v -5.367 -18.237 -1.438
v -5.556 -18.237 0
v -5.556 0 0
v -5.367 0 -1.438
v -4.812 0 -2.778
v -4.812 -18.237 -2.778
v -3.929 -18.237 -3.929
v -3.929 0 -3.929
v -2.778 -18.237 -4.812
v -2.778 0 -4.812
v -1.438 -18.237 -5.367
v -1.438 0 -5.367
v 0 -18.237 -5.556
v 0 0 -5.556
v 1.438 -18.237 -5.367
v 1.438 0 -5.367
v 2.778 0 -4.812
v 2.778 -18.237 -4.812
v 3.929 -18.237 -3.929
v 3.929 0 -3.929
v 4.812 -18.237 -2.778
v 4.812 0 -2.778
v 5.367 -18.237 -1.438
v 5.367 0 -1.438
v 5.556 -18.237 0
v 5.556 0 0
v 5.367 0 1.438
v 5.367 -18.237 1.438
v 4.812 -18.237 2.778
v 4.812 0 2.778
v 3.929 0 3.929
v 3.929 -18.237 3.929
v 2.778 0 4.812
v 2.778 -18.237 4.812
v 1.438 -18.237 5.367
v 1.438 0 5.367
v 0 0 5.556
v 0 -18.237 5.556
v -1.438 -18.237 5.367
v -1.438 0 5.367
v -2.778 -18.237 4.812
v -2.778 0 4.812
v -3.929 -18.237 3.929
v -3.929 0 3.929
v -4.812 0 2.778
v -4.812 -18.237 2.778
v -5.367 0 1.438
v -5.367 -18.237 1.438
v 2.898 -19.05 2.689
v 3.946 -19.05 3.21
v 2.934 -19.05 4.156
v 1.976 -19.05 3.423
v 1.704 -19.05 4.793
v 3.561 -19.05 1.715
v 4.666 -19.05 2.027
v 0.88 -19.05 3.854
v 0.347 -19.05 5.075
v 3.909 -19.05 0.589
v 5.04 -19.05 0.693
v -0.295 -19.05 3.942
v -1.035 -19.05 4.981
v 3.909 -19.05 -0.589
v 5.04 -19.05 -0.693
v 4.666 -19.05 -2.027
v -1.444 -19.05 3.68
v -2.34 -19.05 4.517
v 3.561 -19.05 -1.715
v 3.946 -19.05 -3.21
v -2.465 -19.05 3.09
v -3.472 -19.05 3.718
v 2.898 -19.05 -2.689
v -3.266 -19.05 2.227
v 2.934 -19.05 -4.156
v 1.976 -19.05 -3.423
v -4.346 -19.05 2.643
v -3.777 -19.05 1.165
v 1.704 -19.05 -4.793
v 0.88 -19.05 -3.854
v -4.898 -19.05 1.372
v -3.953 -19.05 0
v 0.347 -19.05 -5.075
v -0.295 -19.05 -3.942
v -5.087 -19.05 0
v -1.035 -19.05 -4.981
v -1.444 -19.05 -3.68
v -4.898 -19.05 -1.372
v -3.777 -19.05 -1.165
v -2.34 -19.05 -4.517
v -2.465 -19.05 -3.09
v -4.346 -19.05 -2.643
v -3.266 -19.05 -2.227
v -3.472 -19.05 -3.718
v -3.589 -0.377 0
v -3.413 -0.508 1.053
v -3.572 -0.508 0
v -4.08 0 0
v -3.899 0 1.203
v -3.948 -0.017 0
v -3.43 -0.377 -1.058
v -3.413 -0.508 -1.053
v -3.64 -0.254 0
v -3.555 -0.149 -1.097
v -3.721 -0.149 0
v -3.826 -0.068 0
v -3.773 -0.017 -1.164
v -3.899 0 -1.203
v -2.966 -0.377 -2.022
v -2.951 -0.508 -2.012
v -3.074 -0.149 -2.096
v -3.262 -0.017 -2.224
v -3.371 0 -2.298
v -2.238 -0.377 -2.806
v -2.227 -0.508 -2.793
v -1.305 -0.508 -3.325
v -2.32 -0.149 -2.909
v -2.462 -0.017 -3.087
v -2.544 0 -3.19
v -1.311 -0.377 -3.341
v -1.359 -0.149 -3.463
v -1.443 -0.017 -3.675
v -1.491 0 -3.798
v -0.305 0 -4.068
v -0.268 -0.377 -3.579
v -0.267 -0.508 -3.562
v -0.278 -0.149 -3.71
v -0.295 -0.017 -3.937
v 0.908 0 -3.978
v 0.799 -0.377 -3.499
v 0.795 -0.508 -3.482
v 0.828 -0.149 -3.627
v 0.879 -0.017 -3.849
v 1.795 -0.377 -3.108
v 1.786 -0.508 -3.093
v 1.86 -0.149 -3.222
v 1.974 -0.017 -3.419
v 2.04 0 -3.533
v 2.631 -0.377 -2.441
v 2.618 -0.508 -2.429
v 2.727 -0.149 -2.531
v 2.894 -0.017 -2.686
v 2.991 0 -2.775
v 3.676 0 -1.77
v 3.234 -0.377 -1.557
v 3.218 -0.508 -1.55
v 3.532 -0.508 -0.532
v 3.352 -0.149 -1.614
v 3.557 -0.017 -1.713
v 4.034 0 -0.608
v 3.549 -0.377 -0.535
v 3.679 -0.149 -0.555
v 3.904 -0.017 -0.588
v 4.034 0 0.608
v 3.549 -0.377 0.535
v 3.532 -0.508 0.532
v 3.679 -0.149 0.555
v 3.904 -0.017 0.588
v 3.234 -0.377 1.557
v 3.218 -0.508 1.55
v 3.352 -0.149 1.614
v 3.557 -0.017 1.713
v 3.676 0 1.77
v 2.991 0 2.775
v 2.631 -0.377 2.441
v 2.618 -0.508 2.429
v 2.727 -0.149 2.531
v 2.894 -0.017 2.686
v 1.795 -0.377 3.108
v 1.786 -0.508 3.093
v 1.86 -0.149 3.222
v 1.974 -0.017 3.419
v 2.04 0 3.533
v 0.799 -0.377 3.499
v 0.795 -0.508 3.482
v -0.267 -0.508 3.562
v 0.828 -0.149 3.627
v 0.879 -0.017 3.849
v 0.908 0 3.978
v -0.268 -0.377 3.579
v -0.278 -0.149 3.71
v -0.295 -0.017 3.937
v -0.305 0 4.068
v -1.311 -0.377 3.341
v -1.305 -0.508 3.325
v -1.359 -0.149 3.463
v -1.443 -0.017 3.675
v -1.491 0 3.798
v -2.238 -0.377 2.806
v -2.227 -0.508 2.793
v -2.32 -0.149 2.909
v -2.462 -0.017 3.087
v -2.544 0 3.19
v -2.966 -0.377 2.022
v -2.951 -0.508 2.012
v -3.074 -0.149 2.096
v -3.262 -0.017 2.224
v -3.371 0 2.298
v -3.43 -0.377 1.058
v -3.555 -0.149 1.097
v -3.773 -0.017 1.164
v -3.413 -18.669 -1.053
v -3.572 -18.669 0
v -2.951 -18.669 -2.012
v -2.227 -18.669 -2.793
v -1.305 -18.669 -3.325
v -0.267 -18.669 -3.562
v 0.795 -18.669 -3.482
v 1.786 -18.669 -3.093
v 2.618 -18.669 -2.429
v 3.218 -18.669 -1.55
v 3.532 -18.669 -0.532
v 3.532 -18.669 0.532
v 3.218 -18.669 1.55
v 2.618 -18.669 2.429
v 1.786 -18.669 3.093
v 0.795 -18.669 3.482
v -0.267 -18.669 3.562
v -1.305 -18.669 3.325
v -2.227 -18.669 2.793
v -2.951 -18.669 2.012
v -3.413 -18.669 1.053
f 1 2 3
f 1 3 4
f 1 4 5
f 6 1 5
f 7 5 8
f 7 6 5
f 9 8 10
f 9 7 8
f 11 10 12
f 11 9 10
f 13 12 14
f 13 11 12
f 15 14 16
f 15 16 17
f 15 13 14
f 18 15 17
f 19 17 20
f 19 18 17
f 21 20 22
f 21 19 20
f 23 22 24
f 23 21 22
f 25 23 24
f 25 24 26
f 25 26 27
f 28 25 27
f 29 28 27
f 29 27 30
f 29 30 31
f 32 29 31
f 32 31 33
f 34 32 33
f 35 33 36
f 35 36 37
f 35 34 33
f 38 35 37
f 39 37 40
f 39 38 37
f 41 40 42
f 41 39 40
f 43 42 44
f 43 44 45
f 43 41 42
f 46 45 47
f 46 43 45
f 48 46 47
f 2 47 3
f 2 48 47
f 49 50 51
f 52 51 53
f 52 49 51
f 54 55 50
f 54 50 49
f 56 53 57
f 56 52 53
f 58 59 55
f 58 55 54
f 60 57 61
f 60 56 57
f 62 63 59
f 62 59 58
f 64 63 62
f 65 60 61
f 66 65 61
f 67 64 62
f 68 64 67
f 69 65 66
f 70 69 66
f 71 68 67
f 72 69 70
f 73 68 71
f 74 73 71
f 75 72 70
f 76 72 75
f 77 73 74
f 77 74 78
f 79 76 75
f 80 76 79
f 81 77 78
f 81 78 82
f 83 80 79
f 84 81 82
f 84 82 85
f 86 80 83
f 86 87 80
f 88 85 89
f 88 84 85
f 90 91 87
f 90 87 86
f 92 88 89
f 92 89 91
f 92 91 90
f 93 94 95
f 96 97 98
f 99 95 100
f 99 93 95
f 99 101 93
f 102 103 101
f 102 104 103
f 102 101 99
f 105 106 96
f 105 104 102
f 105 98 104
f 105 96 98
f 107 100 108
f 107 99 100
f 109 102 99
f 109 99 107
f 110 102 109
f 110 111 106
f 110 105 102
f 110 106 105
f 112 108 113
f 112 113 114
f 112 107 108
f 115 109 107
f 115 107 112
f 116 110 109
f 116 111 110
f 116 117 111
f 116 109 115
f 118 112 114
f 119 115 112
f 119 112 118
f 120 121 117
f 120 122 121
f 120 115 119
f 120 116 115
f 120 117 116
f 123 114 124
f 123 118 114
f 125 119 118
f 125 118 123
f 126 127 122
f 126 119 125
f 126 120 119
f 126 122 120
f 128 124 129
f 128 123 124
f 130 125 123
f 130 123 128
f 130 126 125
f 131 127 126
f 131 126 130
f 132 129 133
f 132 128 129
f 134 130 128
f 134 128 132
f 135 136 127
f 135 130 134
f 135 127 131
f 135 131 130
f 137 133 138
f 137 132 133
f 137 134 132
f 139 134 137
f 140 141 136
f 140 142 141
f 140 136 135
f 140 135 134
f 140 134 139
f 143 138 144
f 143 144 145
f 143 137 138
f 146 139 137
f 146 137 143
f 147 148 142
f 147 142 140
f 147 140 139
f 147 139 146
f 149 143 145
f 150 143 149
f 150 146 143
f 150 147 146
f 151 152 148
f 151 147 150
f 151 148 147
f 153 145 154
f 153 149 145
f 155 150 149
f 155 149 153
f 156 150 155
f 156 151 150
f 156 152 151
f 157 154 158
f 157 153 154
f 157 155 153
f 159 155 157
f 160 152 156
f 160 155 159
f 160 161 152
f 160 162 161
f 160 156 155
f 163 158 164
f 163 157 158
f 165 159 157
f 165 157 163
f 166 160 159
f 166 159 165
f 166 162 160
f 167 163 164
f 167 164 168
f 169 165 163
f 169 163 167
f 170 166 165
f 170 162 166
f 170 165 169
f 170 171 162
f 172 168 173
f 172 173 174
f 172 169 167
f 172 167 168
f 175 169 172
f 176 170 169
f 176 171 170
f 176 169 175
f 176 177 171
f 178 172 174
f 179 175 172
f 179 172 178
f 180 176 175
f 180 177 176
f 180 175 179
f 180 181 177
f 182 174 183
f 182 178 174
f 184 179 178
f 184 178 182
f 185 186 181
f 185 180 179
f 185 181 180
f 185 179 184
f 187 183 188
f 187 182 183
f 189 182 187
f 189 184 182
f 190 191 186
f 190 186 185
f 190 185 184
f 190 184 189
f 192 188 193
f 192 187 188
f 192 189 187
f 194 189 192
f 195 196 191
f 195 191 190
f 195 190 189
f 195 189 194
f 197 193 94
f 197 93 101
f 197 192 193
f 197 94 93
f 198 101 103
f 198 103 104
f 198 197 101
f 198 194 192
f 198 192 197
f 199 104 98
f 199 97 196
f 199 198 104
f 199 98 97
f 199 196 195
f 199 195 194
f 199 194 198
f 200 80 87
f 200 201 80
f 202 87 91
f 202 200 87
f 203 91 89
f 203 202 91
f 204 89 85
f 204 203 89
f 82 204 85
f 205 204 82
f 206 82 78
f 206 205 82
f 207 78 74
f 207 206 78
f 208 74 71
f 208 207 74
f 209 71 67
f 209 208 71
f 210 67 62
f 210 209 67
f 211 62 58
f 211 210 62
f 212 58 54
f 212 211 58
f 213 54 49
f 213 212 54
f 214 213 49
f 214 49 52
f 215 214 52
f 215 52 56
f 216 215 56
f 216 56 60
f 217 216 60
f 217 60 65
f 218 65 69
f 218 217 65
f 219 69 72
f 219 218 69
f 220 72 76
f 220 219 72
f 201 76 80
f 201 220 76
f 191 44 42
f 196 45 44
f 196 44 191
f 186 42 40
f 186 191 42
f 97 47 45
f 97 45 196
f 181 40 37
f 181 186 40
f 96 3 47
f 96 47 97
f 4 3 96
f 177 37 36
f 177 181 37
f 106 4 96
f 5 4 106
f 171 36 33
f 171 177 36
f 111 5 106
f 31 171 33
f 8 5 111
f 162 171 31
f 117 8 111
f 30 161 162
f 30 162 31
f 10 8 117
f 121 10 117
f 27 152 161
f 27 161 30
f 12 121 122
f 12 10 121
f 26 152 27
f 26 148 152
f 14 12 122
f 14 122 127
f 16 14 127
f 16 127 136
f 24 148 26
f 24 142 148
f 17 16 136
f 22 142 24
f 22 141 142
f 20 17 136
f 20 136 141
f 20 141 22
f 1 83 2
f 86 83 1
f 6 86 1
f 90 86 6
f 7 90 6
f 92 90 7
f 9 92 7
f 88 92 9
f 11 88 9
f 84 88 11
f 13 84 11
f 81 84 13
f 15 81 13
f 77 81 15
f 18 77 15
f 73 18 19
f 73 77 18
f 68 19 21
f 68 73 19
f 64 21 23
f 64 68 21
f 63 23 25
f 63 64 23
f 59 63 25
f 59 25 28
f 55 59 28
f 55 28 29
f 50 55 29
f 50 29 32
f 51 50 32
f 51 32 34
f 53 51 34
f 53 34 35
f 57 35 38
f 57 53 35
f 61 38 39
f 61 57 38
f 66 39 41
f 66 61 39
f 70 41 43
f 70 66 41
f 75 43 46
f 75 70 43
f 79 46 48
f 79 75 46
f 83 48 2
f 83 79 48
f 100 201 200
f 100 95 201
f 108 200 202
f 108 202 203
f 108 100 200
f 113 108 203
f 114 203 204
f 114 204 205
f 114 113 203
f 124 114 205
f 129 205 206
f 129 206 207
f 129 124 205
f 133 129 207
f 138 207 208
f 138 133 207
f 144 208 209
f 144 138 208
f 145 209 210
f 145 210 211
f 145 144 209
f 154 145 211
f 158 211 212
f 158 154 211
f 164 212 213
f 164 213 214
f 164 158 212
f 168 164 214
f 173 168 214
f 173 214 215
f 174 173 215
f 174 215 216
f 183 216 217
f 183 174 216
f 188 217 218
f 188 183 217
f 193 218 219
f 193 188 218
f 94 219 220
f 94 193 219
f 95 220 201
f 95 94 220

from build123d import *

# Parameters (mm, degrees)
CHAMFER1_SIZE  = 0.8128
CHAMFER1_SIZE2 = 0.469270299


with BuildPart() as part:
    # Sketch1 → BODY (revolve)
    with BuildSketch(Plane.XY, mode=Mode.PRIVATE) as body_sk:
        with BuildLine():
            Line((4.079875, 0), (5.55625, 0))
            Line((5.55625, 0), (5.55625, -19.05))
            Line((5.55625, -19.05), (3.952875, -19.05))
            Line((3.952875, -19.05), (3.571875, -18.669))
            Line((3.571875, -18.669), (3.571875, -0.508))
            ThreePointArc((3.571875, -0.508), (3.720664755, -0.148789755), (4.079875, 0))
        make_face()
    revolve(body_sk.sketch.rotate(Axis((0, 0, 0), (0, -1, 0)), 180), axis=Axis((0, 0, 0), (0, -1, 0)))

    # Chamfer1
    chamfer1_edges = [part.edges().sort_by_distance(p)[0] for p in [
        (5.55625, -19.05, 0),
    ]]
    chamfer1_side = [part.faces().sort_by_distance(p)[0] for p in [
        (5.55625, -9.525, 0),
    ]]
    chamfer(chamfer1_edges, length=CHAMFER1_SIZE, length2=CHAMFER1_SIZE2, reference=chamfer1_side[0])


solid = part.part
